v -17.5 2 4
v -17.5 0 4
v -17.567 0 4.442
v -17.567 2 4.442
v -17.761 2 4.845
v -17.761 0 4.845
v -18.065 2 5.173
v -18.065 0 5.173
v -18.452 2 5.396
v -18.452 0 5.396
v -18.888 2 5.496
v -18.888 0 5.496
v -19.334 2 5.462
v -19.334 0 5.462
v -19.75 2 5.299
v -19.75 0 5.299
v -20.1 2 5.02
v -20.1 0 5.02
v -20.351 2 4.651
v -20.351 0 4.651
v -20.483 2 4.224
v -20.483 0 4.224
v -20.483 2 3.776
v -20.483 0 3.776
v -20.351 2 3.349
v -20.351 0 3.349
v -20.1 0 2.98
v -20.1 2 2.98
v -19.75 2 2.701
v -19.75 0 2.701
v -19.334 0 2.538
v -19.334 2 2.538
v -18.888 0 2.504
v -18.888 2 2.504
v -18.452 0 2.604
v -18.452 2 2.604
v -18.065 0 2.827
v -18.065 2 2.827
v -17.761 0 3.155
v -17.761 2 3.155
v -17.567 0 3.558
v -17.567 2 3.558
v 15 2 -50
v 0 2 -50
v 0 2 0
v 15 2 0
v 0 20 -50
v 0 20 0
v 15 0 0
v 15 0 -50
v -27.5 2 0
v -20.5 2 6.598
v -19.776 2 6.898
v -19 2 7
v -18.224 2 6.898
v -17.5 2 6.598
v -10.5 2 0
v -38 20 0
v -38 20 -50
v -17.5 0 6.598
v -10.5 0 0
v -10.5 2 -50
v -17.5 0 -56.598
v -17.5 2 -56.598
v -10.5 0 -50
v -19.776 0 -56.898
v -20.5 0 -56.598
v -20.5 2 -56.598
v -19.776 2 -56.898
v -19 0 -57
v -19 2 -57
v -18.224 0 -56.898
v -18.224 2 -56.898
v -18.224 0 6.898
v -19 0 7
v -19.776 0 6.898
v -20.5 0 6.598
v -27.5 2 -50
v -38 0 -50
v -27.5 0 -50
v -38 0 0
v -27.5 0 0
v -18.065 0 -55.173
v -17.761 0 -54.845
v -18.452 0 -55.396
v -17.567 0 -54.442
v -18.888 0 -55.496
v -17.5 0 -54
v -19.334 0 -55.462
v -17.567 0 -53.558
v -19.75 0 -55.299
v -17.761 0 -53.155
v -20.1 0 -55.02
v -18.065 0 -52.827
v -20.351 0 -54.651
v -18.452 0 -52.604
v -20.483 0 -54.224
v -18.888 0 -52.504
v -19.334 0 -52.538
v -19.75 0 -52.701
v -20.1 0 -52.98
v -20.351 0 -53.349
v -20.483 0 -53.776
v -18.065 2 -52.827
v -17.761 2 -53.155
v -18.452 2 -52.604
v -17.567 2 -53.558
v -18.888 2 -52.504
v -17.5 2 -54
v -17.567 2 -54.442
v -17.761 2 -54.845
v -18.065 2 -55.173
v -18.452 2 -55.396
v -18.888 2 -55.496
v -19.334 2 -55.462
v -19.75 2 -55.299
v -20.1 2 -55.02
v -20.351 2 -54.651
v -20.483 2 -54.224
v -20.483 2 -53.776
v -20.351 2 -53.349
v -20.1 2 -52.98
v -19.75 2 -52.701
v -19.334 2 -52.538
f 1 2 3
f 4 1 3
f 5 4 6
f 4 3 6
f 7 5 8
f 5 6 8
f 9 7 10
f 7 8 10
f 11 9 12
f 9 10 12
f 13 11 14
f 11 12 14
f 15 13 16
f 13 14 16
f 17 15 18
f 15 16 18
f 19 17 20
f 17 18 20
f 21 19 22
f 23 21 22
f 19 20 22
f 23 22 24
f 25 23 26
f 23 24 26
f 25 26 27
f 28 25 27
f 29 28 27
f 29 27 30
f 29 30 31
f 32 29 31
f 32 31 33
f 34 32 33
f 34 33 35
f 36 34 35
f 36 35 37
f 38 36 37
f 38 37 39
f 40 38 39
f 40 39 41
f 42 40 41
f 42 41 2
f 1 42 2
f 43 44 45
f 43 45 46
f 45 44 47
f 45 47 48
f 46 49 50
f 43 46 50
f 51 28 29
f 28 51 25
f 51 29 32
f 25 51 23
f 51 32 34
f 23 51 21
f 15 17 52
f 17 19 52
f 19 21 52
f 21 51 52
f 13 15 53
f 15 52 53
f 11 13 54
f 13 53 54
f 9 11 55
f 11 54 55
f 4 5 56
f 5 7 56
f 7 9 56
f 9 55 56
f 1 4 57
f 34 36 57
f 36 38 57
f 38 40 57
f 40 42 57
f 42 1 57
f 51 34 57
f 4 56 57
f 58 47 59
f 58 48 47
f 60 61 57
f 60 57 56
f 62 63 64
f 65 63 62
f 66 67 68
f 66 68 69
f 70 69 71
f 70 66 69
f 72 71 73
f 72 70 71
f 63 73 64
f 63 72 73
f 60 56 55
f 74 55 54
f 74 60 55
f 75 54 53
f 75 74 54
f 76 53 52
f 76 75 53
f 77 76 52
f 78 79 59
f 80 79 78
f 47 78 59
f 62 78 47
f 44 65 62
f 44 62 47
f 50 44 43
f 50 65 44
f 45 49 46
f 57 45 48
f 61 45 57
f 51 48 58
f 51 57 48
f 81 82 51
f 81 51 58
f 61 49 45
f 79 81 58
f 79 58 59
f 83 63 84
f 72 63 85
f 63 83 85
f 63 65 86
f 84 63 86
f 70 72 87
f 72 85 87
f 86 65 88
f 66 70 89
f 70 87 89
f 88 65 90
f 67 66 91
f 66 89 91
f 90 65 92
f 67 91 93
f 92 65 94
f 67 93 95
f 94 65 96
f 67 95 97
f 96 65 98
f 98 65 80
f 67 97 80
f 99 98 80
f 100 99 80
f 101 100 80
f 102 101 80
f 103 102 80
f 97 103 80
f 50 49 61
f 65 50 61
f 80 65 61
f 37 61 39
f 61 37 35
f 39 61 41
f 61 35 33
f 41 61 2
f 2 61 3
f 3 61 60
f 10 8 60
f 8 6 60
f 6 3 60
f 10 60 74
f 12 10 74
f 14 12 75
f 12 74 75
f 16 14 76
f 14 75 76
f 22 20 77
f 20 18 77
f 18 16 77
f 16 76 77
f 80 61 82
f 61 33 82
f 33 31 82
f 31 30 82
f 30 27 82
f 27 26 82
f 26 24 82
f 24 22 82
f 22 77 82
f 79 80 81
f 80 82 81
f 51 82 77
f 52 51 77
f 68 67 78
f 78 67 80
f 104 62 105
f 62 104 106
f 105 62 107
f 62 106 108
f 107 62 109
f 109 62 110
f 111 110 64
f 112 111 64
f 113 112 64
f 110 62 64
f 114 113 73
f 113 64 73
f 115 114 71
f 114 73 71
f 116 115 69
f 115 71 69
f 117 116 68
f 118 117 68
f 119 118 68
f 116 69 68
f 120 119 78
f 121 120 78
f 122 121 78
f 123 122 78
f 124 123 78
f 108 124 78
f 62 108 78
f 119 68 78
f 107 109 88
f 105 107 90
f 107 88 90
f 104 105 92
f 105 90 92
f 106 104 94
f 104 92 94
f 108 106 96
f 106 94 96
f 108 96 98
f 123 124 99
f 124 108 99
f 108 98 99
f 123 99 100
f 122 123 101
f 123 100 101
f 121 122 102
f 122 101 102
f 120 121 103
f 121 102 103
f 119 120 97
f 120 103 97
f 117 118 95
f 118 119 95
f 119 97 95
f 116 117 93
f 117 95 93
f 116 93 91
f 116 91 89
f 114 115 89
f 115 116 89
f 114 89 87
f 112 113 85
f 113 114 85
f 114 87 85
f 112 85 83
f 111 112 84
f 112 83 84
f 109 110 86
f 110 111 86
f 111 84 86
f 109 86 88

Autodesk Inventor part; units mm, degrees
ref_plane "YZ Plane" through (0, 0, 0) normal (1, 0, 0) x (0, 1, 0)
ref_plane "XZ Plane" through (0, 0, 0) normal (0, 1, 0) x (-1, 0, 0)
sketch "Sketch1" plane through (0, 0, 0) normal (0, 1, 0) x (-1, 0, 0)
  line L0 (0, 0) -> (38, 0)
  line L1 (38, 0) -> (38, -50)
  line L2 (38, -50) -> (0, -50)
  line L3 (0, -50) -> (0, 0)
  dimension "d0" = 38
  dimension "d1" = 50
extrude "Extrusion1" add sketch "Sketch1" along normal blind 20
sketch "Sketch2" plane through (0, 0, 0) normal (0, -1, 0) x (1, 0, 0)
  line L0 (0, 0) -> (0, -50) projected
  line L1 (0, 0) -> (15, 0)
  line L2 (15, 0) -> (15, -50)
  line L3 (15, -50) -> (0, -50)
  line L4 (0, -50) -> (0, 0)
  dimension "d4" = 15
  dimension "d5" = 50
extrude "Extrusion2" add sketch "Sketch2" against normal blind 2
sketch "Sketch3" plane through (0, 0, 0) normal (0, -1, 0) x (1, 0, 0)
  line L0 (-38, 0) -> (0, 0) projected
  line L1 (-19, 0) -> (-19, 7)
  line L2 (-19, 0) -> (-19, 4)
  line L3 (-19, 0) -> (-10.5, 0)
  line L4 (-19, 0) -> (-27.5, 0)
  circle A0 centre (-19, 4) radius 1.5
  circle A1 centre (-19, 4) radius 3
  line L5 (-10.5, 0) -> (-17.5, 6.5981)
  line L6 (-27.5, 0) -> (-20.5, 6.5981)
  dimension "d8" = 7
  dimension "d9" = 4
  dimension "d10" = 8.5
  dimension "d11" = 8.5
  dimension "d12" = 3
  dimension "d13" = 6.5981
  dimension "d14" = 6.5981
extrude "Extrusion3" add sketch "Sketch3" against normal blind 2 contours L6 A1 L1 L0 | L1 A1 L5 L0 | L6 A1 L1 A0 | L1 A0 A1 L5
ref_plane "Work Plane1" through (-38, 20, -25) normal (0, 0, 1) x (1, 0, 0)
mirror "Mirror1" about plane through (-38, 20, -25) normal (0, 0, 1) of "Extrusion3"
properties part number "25W_1224_5V"
